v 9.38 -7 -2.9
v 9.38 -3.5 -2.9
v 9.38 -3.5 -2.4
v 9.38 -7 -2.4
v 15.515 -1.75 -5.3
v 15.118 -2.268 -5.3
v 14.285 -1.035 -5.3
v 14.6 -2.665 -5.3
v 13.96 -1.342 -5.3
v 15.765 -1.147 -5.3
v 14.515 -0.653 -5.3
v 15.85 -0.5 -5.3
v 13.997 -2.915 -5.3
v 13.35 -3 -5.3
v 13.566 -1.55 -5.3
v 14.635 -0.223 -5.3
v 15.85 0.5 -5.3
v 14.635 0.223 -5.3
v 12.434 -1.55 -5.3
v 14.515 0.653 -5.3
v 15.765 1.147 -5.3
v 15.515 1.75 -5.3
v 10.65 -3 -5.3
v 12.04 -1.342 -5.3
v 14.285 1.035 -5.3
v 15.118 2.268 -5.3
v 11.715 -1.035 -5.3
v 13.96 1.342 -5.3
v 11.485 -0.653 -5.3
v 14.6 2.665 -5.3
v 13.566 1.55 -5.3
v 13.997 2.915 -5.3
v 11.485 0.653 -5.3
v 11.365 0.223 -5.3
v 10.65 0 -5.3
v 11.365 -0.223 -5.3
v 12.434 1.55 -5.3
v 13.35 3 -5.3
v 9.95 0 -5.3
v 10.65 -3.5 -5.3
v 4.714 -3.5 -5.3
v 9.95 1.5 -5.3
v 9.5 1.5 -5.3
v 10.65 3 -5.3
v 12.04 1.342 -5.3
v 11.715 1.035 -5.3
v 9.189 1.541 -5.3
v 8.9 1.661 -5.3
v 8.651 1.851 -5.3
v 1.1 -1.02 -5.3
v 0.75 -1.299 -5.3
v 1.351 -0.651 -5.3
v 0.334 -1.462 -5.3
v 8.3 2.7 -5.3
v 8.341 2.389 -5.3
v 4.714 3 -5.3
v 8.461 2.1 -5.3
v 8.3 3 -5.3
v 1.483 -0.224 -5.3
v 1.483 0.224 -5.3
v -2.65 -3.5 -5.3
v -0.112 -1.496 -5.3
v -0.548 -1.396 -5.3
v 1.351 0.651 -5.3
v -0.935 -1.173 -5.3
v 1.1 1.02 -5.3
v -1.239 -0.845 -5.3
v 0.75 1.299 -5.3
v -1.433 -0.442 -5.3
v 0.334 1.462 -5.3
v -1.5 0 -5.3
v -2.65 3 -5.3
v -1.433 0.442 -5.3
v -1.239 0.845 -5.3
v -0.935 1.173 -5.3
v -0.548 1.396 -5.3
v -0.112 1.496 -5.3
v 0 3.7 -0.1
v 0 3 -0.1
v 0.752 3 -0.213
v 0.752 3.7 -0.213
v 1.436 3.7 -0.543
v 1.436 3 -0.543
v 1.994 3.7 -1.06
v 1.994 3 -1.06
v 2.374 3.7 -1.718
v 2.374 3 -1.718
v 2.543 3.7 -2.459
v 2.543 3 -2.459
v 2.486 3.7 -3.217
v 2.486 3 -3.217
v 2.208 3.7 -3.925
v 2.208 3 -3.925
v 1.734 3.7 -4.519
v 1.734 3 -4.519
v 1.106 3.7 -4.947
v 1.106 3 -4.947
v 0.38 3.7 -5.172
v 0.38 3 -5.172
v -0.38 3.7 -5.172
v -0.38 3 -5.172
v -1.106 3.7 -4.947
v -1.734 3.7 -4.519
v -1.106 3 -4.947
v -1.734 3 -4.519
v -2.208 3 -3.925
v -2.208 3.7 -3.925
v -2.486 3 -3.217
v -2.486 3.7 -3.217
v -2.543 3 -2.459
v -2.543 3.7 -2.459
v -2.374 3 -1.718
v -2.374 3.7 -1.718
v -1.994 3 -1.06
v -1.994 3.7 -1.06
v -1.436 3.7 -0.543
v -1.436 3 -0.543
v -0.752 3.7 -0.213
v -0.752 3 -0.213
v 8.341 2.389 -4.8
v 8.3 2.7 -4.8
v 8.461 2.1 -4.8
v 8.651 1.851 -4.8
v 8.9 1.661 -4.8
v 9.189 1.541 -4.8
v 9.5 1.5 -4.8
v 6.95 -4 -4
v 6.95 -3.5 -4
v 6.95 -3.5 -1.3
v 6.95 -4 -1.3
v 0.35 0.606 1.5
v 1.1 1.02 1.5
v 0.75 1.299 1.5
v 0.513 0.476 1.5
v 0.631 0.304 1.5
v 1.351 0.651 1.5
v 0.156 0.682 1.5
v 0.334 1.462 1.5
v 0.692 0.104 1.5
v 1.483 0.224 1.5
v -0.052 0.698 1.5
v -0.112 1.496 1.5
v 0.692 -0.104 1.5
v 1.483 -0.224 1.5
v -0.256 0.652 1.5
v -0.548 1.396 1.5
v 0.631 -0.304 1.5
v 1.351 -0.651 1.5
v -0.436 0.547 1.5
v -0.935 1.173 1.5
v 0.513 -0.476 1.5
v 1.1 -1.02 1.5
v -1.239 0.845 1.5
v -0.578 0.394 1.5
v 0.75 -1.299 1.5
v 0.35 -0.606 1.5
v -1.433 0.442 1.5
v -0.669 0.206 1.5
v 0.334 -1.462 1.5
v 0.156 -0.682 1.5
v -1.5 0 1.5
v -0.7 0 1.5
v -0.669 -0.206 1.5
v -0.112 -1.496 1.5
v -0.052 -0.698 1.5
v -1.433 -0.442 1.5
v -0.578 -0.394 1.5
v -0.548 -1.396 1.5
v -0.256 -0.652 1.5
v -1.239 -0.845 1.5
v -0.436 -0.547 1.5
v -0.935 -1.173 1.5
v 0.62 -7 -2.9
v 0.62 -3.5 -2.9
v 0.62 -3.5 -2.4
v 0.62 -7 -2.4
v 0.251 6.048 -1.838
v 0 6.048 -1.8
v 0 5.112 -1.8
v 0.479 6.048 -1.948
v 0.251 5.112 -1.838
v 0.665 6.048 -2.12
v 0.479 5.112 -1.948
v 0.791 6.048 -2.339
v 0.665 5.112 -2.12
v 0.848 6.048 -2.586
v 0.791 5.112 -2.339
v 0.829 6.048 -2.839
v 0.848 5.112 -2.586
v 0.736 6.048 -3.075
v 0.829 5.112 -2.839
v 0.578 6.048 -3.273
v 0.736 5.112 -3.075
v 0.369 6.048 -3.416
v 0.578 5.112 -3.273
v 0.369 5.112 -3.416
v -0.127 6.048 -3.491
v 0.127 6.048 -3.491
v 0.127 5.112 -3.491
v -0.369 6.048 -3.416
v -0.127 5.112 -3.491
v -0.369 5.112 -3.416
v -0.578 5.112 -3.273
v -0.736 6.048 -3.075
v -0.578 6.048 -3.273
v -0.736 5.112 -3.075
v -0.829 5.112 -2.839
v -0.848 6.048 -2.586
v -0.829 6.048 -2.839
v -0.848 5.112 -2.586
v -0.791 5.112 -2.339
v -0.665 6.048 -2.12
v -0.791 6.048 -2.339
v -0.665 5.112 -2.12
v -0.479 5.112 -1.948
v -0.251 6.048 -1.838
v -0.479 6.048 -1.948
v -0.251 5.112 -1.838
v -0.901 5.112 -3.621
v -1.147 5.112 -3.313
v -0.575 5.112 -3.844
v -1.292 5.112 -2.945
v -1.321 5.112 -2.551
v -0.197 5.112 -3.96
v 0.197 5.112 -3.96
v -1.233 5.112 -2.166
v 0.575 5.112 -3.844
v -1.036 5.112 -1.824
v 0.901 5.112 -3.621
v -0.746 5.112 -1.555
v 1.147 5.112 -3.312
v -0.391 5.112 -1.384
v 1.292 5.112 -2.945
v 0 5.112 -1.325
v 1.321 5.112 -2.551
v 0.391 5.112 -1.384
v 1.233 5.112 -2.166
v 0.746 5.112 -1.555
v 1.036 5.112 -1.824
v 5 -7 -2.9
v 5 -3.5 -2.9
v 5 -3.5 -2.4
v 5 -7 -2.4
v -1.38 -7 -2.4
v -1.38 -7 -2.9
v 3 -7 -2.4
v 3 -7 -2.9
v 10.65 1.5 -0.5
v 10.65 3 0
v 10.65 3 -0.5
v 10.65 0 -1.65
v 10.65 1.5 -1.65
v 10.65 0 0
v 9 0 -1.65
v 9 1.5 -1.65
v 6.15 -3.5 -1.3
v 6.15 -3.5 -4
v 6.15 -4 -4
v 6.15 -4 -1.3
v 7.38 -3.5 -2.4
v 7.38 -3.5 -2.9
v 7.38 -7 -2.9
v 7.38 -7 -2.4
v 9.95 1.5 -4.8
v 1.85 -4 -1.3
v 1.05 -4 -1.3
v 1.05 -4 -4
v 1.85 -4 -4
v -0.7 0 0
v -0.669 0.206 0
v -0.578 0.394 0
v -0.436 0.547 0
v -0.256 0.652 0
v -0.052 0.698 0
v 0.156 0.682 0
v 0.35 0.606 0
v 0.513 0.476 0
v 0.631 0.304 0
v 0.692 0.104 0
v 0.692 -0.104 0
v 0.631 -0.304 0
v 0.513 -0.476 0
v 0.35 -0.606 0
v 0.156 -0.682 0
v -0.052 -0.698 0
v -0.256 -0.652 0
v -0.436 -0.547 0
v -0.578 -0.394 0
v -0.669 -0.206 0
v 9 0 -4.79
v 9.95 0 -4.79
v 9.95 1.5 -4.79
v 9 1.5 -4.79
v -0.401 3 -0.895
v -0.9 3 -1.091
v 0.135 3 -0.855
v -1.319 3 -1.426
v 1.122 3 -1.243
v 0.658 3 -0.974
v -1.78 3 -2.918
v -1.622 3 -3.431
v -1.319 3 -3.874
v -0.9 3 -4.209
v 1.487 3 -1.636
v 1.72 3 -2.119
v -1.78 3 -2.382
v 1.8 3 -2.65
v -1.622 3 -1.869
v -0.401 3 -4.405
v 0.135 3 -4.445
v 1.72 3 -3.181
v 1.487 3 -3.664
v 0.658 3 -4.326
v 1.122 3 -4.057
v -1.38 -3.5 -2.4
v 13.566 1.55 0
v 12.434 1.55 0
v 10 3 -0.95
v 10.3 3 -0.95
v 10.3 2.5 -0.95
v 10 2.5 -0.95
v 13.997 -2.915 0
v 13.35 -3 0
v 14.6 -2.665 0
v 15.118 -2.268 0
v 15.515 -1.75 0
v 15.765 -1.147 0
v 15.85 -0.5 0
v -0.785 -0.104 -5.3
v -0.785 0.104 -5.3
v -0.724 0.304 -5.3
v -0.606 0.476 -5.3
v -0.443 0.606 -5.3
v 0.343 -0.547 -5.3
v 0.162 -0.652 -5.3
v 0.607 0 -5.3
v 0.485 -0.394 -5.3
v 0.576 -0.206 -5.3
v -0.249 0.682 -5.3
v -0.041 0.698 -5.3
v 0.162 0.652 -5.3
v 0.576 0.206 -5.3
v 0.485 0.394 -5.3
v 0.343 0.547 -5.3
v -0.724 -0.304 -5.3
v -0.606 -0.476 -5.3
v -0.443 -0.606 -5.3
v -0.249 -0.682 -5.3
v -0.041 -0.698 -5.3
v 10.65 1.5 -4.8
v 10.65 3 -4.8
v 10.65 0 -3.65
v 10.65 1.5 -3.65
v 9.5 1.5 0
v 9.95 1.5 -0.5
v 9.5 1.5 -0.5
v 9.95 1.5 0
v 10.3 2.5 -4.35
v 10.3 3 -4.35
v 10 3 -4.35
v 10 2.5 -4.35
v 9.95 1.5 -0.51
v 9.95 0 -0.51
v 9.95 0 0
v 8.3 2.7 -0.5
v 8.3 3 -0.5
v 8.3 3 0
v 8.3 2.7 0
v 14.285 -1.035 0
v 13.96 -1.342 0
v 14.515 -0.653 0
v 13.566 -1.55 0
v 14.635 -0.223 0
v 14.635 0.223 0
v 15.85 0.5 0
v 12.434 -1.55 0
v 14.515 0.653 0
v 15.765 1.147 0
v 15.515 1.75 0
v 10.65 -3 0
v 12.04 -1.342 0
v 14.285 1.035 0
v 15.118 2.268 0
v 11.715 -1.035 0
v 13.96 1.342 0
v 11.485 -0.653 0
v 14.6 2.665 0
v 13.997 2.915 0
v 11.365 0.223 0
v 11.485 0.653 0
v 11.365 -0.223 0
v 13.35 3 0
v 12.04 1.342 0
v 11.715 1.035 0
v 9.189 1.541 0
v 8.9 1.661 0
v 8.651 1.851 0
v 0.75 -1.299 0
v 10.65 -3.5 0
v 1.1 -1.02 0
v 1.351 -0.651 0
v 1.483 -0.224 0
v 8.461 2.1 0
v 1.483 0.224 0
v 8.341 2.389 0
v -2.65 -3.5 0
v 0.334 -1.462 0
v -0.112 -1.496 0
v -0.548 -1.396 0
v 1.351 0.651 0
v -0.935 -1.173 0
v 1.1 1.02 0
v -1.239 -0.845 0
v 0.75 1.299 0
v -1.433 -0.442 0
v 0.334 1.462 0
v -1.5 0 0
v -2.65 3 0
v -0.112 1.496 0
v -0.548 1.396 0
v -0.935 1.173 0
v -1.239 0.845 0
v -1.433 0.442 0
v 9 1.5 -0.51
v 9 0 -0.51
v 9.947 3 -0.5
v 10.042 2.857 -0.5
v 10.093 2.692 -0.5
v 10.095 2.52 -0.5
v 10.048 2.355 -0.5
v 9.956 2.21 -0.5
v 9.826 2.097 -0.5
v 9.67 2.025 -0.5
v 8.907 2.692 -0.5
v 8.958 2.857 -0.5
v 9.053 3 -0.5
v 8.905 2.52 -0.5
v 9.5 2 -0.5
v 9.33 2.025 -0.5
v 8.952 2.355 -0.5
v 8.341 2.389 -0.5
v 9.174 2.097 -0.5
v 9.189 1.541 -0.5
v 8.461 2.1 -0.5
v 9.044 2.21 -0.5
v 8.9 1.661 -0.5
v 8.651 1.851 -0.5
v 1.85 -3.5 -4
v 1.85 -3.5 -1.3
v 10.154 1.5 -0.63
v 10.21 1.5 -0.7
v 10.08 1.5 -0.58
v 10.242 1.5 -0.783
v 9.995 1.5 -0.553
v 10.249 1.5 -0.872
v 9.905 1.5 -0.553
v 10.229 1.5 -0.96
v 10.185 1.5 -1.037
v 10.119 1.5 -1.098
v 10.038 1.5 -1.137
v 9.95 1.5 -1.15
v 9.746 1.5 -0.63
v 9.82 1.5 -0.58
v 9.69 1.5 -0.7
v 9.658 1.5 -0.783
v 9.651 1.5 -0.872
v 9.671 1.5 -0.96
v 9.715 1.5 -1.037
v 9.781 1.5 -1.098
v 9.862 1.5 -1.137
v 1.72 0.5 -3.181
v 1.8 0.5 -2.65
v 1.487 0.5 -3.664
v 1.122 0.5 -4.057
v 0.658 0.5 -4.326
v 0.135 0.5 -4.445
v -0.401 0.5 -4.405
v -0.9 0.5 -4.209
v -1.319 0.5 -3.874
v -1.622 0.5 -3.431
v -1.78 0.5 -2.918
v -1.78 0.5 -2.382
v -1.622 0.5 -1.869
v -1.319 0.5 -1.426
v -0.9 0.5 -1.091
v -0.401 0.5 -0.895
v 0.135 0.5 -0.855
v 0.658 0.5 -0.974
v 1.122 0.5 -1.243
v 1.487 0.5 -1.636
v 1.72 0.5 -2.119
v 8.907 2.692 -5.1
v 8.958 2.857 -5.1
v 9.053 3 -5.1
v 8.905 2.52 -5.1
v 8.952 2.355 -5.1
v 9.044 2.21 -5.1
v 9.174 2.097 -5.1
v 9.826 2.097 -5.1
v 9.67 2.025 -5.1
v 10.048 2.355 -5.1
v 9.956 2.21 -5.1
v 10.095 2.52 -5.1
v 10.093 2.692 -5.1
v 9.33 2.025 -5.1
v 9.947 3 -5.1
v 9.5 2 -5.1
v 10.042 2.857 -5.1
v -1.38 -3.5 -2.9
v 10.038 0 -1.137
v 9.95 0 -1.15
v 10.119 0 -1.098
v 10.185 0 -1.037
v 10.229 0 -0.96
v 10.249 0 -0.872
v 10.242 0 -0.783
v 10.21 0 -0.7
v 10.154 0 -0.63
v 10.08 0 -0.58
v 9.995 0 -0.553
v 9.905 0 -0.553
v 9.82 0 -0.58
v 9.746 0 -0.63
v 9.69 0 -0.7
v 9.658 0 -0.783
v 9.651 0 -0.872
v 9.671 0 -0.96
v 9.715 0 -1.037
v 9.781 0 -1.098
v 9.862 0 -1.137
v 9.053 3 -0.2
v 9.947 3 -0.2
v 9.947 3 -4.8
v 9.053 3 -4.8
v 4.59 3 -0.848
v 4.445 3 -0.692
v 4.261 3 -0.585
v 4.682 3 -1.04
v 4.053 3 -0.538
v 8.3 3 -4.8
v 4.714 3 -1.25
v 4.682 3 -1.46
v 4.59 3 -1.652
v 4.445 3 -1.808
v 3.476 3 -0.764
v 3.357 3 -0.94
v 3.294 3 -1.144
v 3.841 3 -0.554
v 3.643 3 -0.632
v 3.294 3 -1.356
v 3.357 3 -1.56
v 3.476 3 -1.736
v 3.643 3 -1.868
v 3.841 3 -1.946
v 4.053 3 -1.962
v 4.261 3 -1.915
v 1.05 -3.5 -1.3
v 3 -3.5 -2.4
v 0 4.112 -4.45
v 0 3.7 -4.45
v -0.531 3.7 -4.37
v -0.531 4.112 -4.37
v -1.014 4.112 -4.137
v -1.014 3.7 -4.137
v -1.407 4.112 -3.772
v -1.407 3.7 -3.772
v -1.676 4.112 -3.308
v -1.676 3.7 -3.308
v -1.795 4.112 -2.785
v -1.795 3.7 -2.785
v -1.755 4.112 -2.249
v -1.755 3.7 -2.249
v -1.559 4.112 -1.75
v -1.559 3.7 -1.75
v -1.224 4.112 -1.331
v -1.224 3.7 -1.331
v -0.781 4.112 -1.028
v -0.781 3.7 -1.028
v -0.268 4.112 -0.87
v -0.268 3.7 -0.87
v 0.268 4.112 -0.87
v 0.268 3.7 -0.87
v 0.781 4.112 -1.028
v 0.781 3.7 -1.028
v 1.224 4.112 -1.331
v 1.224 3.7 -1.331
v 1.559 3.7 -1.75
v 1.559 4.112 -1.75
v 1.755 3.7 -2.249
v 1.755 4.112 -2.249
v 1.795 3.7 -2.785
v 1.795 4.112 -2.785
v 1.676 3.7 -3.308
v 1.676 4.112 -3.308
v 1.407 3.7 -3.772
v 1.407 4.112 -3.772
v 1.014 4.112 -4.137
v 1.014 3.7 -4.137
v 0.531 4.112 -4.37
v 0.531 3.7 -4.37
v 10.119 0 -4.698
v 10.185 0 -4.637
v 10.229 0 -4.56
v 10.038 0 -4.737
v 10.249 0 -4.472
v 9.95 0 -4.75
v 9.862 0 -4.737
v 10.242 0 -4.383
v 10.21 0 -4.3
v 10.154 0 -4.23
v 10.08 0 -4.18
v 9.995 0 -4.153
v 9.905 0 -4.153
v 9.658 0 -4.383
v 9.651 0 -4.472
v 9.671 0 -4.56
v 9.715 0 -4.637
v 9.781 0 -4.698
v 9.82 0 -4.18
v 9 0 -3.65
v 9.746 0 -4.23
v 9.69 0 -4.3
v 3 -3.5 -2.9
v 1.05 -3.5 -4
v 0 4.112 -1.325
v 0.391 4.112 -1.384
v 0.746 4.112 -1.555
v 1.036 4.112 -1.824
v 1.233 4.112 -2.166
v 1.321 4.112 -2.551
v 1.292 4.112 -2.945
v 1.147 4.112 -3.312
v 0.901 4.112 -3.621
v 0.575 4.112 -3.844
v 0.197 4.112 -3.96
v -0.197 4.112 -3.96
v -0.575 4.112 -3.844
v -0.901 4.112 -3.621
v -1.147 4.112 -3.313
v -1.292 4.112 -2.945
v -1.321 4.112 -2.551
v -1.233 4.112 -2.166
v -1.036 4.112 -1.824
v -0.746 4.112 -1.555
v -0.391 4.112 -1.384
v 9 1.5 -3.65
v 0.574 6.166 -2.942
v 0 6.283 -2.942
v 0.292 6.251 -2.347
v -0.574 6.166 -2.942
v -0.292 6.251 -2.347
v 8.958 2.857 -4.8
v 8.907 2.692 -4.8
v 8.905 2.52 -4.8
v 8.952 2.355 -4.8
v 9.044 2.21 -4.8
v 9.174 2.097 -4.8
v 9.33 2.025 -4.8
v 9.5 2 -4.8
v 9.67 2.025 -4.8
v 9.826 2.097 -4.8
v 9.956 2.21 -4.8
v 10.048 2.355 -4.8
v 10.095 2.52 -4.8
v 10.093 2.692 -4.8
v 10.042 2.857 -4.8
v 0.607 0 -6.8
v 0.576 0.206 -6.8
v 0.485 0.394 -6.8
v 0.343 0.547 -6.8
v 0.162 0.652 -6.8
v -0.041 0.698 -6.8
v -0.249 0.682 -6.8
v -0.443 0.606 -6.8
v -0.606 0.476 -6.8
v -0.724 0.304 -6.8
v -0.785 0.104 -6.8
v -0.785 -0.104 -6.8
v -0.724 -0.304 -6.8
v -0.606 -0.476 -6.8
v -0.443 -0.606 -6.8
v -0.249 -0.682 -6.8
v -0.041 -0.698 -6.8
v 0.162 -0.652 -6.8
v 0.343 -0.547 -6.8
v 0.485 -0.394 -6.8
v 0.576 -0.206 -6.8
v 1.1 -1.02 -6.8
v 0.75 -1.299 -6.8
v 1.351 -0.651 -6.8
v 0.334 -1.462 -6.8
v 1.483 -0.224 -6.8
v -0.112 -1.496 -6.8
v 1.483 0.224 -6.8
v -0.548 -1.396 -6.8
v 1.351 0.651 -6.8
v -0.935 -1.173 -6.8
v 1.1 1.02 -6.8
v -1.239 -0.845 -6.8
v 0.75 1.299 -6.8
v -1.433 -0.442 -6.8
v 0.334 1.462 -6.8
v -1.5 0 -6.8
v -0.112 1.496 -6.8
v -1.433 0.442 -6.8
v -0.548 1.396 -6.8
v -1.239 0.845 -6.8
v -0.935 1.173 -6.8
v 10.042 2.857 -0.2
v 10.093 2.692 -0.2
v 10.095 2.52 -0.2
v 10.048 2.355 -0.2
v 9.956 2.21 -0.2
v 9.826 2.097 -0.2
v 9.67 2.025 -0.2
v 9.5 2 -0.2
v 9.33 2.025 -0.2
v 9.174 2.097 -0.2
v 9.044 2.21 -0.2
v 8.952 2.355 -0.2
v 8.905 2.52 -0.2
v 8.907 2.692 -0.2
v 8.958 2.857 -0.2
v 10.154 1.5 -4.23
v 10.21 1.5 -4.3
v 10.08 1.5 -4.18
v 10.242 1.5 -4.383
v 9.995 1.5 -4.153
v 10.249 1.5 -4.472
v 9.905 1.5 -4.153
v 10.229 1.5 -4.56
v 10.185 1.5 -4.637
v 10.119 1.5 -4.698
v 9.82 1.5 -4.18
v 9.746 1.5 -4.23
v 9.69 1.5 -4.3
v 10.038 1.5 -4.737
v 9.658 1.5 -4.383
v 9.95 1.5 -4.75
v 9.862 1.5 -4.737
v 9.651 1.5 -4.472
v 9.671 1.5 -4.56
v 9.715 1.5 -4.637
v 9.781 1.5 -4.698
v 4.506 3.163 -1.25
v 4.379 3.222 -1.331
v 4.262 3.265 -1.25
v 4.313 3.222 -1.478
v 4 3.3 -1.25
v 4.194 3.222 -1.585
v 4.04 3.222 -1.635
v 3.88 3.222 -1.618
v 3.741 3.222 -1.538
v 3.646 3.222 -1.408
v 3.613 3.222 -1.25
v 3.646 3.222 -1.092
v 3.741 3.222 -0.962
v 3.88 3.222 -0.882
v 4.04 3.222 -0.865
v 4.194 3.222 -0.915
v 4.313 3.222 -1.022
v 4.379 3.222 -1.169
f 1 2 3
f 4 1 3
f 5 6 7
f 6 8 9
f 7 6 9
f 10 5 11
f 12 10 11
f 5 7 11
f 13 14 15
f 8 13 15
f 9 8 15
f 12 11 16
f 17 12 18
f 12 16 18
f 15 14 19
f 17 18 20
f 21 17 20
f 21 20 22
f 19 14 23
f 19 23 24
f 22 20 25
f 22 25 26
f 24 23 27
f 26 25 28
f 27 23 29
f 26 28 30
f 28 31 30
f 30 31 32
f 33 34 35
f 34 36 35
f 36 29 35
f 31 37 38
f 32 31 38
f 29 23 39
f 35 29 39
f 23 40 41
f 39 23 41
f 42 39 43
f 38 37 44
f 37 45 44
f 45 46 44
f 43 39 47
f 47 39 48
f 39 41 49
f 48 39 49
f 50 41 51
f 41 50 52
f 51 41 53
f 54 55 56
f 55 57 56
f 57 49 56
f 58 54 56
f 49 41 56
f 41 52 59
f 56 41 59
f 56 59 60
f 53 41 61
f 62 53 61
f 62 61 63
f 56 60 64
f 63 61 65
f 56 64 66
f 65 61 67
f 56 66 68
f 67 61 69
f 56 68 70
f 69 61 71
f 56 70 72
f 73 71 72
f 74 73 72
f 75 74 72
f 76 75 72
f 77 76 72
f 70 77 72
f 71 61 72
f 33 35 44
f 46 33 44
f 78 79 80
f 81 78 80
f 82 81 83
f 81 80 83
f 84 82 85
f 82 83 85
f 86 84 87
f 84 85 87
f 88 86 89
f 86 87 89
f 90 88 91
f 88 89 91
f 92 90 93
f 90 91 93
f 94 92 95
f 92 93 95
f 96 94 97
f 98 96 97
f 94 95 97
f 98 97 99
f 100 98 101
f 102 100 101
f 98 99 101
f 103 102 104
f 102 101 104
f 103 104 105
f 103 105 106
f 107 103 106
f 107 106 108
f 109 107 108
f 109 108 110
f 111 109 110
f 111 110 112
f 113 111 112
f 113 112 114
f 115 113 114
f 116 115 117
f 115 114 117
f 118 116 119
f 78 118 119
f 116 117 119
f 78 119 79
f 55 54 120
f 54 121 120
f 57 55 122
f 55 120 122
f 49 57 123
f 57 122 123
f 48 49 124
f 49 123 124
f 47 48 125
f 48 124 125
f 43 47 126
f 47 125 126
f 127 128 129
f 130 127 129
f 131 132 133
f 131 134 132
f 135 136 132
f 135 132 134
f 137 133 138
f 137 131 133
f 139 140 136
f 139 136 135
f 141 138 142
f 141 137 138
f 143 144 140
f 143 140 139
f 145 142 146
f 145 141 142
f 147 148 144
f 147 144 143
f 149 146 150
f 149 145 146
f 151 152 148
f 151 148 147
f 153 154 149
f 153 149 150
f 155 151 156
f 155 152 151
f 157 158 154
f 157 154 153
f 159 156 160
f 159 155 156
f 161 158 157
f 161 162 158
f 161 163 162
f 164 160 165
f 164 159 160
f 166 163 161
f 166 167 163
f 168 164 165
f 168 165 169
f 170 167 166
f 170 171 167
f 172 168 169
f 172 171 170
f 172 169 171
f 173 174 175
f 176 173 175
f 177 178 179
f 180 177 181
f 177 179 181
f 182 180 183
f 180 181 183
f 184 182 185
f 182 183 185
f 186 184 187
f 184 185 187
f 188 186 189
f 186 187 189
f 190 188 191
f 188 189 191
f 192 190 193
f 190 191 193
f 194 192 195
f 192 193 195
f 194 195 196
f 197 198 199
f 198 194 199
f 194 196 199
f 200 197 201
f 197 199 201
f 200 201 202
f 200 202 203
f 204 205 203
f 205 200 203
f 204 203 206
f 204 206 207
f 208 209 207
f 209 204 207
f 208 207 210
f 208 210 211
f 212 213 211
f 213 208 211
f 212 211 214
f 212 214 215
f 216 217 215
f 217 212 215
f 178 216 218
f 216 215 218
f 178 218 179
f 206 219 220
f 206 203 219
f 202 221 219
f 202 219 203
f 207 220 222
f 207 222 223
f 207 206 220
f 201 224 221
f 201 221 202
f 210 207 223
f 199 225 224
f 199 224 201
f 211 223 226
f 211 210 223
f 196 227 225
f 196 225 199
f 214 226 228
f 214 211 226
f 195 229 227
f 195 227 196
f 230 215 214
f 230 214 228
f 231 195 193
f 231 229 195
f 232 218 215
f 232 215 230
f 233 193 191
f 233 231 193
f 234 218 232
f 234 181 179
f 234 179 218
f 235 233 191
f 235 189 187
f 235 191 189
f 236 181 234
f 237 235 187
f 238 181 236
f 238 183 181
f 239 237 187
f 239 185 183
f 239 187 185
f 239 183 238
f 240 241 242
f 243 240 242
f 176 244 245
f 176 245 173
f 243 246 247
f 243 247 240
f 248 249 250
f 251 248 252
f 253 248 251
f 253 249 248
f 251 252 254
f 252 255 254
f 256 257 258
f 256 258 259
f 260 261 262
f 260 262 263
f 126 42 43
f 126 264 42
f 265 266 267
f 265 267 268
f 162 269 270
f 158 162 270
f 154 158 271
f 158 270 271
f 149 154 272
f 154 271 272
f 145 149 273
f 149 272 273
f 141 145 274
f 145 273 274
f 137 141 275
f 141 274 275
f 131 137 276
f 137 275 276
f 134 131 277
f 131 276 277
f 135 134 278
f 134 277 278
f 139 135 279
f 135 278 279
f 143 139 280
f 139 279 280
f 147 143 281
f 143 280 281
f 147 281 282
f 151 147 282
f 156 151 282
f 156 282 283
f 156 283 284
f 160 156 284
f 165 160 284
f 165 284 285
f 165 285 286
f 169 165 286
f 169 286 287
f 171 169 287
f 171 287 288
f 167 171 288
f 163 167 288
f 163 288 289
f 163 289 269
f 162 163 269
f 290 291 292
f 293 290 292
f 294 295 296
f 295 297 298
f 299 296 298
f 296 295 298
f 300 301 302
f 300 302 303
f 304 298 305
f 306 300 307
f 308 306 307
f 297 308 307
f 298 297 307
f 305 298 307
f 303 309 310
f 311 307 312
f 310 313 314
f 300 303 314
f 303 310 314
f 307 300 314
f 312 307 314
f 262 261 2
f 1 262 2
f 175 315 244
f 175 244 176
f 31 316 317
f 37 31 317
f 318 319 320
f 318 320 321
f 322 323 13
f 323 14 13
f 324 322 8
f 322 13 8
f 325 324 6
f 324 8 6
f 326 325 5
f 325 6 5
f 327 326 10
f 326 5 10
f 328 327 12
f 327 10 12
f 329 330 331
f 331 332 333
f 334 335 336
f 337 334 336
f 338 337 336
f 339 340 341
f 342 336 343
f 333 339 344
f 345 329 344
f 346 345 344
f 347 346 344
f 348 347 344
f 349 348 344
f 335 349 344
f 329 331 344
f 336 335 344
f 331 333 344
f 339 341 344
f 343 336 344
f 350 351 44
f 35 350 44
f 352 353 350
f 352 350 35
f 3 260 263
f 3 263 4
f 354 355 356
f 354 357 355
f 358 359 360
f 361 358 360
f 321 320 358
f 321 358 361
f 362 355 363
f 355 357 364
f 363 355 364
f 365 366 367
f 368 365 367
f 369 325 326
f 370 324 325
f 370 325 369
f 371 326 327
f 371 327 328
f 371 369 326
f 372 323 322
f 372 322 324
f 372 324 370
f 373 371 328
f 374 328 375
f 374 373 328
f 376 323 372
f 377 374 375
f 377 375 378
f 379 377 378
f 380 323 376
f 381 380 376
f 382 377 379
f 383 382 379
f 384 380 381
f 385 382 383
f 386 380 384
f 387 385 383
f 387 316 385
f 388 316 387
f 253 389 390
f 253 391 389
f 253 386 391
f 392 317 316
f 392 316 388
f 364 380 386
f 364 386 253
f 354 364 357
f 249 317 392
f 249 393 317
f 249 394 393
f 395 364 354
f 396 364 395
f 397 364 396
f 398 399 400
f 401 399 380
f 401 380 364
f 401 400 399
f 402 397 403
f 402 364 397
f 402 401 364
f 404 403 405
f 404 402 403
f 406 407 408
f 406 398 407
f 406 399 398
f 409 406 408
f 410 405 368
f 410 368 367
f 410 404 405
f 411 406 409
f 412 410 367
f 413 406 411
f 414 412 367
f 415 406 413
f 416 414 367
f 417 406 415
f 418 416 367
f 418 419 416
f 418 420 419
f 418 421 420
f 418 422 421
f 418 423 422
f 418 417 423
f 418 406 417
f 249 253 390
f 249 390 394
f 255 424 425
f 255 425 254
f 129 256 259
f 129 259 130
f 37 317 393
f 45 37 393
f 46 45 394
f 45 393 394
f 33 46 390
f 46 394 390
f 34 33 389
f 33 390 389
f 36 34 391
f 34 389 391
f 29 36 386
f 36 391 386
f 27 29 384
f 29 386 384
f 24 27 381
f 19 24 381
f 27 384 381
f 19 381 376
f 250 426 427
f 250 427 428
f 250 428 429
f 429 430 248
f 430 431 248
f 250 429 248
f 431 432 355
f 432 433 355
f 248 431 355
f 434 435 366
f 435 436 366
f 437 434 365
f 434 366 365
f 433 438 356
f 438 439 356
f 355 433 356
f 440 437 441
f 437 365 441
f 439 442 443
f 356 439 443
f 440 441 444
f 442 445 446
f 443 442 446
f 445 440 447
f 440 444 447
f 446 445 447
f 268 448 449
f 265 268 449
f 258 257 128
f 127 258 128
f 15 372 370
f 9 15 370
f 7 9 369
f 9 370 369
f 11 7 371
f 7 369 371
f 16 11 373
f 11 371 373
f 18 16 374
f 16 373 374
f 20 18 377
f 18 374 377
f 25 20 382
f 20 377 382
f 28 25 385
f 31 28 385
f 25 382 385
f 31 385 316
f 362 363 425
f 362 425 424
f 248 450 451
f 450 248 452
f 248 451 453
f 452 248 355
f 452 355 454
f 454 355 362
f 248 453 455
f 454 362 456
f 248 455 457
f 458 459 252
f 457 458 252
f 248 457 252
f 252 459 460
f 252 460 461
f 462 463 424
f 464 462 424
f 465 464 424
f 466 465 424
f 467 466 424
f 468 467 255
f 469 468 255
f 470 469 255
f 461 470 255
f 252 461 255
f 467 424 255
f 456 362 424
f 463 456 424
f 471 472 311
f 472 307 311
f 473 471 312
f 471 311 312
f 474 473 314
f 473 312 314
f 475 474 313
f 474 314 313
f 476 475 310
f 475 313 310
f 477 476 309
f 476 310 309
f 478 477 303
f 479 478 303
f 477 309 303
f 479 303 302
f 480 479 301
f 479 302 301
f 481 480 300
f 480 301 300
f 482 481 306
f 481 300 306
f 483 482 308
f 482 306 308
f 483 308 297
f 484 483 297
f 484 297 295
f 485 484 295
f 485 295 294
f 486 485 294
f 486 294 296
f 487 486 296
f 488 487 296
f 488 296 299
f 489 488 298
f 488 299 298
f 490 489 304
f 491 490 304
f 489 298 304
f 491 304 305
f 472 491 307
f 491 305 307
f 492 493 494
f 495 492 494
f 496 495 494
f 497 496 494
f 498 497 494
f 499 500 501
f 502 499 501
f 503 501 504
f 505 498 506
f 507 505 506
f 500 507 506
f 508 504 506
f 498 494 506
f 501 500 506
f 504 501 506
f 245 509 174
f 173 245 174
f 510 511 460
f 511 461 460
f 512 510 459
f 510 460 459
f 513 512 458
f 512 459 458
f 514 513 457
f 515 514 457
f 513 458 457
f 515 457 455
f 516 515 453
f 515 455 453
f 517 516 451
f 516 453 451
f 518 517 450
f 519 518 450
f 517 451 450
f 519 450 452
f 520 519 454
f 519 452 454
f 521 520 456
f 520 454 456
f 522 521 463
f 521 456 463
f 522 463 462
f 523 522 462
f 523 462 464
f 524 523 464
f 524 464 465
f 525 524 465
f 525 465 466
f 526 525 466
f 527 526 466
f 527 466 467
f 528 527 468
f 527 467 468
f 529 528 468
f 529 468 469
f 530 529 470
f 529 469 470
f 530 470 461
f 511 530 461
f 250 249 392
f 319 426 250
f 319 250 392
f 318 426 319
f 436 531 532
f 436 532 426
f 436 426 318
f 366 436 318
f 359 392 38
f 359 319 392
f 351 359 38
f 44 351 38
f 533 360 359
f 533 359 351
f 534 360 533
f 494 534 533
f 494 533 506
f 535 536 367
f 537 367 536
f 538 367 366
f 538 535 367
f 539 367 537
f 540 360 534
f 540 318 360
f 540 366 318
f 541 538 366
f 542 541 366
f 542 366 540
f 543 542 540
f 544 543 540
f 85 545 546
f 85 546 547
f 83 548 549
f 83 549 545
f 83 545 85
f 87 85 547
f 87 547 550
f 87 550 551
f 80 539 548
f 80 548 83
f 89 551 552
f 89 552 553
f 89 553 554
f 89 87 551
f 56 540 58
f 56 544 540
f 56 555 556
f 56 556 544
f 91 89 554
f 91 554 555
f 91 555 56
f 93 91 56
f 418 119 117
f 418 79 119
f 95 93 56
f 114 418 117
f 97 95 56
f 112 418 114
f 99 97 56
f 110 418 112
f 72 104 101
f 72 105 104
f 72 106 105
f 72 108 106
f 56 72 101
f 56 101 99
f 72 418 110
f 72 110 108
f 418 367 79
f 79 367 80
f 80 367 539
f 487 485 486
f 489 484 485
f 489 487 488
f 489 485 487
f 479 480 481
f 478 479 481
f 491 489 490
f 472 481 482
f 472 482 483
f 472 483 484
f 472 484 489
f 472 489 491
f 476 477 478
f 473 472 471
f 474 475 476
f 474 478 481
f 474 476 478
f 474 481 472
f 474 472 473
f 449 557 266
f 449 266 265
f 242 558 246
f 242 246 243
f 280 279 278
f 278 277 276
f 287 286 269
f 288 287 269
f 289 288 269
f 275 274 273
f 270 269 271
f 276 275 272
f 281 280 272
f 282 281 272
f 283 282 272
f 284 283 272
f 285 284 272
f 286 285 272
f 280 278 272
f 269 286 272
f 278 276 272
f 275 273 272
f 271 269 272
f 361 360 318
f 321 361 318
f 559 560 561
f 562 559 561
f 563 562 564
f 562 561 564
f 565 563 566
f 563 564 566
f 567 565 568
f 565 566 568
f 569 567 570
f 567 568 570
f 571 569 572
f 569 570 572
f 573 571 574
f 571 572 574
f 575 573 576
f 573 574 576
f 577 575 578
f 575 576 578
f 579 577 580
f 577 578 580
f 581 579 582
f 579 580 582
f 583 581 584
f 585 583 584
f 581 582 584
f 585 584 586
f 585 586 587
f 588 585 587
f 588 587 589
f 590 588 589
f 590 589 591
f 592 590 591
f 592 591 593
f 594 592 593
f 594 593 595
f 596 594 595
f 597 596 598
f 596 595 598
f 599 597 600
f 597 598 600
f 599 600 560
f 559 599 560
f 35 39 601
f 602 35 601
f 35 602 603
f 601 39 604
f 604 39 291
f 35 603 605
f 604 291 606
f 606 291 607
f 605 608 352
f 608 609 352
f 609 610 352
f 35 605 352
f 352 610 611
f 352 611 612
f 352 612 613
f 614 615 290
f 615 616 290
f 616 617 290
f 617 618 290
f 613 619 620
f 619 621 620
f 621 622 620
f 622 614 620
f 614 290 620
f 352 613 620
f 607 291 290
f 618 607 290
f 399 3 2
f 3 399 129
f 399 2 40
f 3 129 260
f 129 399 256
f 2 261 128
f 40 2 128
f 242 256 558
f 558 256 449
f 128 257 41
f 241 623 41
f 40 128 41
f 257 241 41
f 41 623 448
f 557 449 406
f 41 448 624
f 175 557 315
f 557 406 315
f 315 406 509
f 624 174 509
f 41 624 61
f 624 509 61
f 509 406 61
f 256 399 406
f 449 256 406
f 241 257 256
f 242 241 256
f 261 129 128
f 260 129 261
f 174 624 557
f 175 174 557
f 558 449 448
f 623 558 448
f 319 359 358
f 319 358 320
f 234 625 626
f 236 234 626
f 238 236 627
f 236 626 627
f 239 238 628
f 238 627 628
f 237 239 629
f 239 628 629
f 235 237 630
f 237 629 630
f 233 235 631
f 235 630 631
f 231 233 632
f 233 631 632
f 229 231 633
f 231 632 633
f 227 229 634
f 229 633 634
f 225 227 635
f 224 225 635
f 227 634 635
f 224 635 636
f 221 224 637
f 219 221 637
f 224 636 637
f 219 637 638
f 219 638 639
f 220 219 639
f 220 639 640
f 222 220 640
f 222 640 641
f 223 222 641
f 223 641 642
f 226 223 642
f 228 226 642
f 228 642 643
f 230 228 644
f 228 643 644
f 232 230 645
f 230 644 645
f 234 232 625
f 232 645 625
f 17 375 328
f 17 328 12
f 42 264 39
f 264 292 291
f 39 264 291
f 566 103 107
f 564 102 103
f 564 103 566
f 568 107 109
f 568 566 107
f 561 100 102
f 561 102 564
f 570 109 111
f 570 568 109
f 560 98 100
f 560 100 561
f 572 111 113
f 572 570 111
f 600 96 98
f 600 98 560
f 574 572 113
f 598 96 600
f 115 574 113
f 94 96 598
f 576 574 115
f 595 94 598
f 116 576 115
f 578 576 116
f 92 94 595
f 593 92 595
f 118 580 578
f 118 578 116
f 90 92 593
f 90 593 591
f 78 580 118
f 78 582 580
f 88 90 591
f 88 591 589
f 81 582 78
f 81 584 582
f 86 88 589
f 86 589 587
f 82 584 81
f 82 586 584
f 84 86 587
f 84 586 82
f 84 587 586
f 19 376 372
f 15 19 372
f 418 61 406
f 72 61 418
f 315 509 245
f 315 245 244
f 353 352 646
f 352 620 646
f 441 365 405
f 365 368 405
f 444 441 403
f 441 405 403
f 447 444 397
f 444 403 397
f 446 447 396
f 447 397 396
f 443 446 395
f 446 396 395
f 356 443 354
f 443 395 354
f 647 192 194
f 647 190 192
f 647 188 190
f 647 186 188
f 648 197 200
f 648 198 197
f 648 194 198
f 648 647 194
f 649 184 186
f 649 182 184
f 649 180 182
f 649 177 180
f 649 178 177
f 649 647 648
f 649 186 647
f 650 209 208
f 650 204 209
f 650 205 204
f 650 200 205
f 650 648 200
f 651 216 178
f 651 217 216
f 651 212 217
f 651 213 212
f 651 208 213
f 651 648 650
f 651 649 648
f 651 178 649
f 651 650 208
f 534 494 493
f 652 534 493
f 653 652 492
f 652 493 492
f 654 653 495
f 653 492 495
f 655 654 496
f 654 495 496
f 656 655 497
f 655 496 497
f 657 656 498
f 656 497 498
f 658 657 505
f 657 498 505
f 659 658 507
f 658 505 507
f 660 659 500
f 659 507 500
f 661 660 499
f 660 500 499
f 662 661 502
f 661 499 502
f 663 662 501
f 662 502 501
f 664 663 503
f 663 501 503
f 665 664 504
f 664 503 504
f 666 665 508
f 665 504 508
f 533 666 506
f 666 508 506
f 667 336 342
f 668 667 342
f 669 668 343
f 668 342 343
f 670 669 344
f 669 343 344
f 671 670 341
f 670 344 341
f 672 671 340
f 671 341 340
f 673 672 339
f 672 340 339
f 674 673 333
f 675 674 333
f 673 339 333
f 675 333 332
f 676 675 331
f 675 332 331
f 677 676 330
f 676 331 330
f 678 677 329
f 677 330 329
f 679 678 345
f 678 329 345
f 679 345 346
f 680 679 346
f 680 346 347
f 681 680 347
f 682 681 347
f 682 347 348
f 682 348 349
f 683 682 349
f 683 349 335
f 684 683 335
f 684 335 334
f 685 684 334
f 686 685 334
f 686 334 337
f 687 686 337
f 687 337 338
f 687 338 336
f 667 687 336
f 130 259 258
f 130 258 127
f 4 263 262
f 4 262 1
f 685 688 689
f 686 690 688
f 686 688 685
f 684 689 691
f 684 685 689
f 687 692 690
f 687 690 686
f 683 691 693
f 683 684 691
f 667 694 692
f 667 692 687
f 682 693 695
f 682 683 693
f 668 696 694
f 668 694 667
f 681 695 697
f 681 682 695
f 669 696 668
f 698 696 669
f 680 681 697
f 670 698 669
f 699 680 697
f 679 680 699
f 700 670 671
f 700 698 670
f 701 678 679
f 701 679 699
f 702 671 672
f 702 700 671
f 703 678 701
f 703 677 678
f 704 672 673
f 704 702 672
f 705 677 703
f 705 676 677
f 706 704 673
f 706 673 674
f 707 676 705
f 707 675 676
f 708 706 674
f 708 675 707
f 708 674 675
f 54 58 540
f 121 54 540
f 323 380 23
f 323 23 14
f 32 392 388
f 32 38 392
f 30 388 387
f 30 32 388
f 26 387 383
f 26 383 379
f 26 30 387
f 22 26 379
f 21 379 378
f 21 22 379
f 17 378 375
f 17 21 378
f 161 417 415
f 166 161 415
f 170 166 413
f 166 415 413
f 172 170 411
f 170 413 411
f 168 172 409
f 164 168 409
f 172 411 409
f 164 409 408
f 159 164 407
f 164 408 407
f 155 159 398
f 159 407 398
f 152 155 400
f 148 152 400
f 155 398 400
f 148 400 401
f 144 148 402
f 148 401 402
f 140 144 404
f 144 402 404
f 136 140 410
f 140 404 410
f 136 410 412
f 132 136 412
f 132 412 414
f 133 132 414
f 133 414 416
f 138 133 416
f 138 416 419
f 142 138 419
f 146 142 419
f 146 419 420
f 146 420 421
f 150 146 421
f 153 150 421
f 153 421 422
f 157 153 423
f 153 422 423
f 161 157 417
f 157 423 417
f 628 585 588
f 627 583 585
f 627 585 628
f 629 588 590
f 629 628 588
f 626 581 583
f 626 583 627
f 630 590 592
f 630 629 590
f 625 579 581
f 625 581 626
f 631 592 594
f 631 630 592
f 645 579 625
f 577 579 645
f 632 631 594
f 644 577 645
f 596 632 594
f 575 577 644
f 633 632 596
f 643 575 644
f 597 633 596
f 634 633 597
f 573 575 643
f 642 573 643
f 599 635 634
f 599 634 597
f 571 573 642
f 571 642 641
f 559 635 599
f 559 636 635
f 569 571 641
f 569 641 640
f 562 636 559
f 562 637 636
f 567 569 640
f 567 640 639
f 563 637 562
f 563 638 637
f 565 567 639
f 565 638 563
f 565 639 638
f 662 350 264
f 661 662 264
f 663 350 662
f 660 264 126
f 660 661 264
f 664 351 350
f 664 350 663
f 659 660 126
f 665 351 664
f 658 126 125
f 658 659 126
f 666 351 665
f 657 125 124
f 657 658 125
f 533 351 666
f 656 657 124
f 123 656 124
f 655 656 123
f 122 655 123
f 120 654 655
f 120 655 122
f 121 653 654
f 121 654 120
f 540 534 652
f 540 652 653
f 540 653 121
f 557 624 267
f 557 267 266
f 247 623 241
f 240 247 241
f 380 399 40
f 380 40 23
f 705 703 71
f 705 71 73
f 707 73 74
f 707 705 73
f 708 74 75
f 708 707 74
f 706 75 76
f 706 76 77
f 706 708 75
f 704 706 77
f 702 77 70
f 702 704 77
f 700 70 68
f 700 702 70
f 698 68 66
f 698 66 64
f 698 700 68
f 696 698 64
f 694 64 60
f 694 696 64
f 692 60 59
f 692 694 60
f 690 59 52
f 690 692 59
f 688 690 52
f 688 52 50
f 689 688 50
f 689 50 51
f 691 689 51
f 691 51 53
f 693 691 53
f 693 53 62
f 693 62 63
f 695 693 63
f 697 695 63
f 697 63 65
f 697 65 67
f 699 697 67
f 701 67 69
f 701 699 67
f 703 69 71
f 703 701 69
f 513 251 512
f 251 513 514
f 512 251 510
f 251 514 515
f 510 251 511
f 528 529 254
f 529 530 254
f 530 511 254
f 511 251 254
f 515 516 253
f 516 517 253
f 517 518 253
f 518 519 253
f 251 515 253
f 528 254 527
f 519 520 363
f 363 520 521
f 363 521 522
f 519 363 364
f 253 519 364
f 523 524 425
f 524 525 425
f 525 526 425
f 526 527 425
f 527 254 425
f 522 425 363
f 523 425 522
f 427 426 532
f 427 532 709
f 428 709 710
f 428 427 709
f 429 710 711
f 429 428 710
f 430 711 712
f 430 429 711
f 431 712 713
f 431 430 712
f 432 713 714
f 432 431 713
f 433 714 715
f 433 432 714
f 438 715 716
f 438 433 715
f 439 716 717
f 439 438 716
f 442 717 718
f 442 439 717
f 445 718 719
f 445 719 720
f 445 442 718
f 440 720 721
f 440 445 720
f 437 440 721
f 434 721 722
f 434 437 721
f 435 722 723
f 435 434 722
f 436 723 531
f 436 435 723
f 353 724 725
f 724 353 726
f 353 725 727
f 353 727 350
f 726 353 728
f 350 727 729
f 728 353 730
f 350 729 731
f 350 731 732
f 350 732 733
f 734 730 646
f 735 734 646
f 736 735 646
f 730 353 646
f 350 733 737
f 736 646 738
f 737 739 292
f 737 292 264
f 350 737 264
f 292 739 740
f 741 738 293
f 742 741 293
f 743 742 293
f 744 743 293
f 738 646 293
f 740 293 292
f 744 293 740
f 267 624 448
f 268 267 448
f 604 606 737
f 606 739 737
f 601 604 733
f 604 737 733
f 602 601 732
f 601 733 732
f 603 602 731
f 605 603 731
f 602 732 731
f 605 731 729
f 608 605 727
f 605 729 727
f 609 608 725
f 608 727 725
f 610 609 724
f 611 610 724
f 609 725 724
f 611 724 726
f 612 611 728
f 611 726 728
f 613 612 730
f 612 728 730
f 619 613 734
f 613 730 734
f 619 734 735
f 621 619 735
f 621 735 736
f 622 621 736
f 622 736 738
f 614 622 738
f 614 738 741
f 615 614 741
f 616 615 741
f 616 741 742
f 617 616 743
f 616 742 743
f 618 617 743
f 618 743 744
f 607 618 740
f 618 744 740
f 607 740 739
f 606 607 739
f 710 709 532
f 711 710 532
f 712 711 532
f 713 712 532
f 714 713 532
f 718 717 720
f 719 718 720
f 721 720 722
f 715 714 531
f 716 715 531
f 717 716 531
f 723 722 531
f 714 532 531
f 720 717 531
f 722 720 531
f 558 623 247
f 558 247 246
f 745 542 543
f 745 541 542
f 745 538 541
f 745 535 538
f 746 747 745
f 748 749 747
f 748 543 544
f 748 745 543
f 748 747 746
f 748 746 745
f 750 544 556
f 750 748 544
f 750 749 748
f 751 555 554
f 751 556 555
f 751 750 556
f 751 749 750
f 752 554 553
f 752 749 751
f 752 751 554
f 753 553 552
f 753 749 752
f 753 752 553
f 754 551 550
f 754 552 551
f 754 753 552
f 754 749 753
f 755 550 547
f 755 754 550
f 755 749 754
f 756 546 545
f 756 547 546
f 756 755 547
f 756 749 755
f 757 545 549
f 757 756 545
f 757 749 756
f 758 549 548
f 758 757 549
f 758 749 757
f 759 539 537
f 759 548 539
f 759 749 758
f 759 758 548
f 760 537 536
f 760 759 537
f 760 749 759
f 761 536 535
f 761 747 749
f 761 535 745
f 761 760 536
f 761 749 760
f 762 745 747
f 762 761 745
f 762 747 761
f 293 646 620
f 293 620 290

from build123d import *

# Parameters (mm, degrees)
BOSS_EXTRUDE1_START            = -6.5
BOSS_EXTRUDE1_OUTLINE_W        = 7.364142843
BOSS_EXTRUDE1_OUTLINE_H        = 4.764142843
BOSS_EXTRUDE1_DEPTH            = 6.5
SKETCH2_W                      = 7.364142843
SKETCH2_H                      = 6.5
BOSS_EXTRUDE2_DEPTH            = 0.535857157
SKETCH3_W                      = 5.3
SKETCH3_H                      = 6.5
BOSS_EXTRUDE3_DEPTH            = 11.135857157
CUT_EXTRUDE1_DEPTH             = 0.7
SKETCH5_W                      = 1.14
SKETCH5_H                      = 1.5
CUT_EXTRUDE2_DEPTH             = 0.95
CUT_EXTRUDE3_DEPTH             = 0.7
SKETCH7_W                      = 1.14
SKETCH7_H                      = 1.5
CUT_EXTRUDE4_DEPTH             = 0.95
SKETCH8_W                      = 5.2
SKETCH8_H                      = 0.5
CUT_EXTRUDE5_DEPTH             = 18.075201317
CUT_EXTRUDE6_DEPTH             = 18.075201317
SKETCH10_W                     = 2
SKETCH10_H                     = 0.5
BOSS_EXTRUDE4_DEPTH            = 3.5
SKETCH11_W                     = 2
SKETCH11_H                     = 0.5
BOSS_EXTRUDE5_DEPTH            = 3.5
SKETCH12_W                     = 2
SKETCH12_H                     = 0.5
BOSS_EXTRUDE6_DEPTH            = 3.5
SKETCH13_W                     = 0.8
SKETCH13_H                     = 2.7
BOSS_EXTRUDE7_DEPTH            = 0.5
SKETCH14_W                     = 0.8
SKETCH14_H                     = 2.7
BOSS_EXTRUDE8_DEPTH            = 0.5
SKETCH15_R                     = 2.55
BOSS_EXTRUDE9_DEPTH            = 0.7
SKETCH16_R                     = 1.8
BOSS_EXTRUDE10_DEPTH           = 0.411605056
SKETCH17_R                     = 1.325
BOSS_EXTRUDE11_DEPTH           = 1
BOSS_EXTRUDE12_REACH           = 22.64
BOSS_EXTRUDE12_END_RADIUS      = 1.5
SKETCH18_R                     = 0.85
SKETCH19_R                     = 1.5
BOSS_EXTRUDE13_DEPTH           = 1.5
BOSS_EXTRUDE14_START           = 1.5
SKETCH20_R                     = 1.5
BOSS_EXTRUDE14_DEPTH           = 1.5
SKETCH21_W                     = 1.65
SKETCH21_H                     = 0.5
CUT_EXTRUDE7_DEPTH             = 1.5
SKETCH22_W                     = 1.65
SKETCH22_H                     = 0.5
CUT_EXTRUDE8_DEPTH             = 1.5
BOSS_EXTRUDE15_DEPTH           = 0.3
BOSS_EXTRUDE16_START           = 0.3
BOSS_EXTRUDE16_DEPTH           = 0.3
SKETCH25_W                     = 0.29999989
SKETCH25_H                     = 3.4
CUT_EXTRUDE9_DEPTH             = 0.5
SKETCH26_W                     = 1.8
SKETCH26_H                     = 2.5
SKETCH27_W                     = 0.3
SKETCH27_H                     = 1.5
SKETCH28_W                     = 0.3
SKETCH28_H                     = 1.5
F_1_4_1_4_DIAMETER_HOLE1_D     = 1.4
F_1_4_1_4_DIAMETER_HOLE1_DEPTH = 1.5
F_1_4_1_4_DIAMETER_HOLE2_D     = 1.4
F_1_4_1_4_DIAMETER_HOLE2_DEPTH = 1.5
FILLET1_R                      = 1.2
FILLET2_R                      = 2.5


with BuildPart() as part:
    # Boss-Extrude1: read off the stored shape, not the designer's step
    # Boss-Extrude1 outline → Boss-Extrude1 (new body)
    with BuildSketch(Plane(origin=(0, 3, 0), x_dir=(1, 0, 0), z_dir=(0, 1, 0)).offset(BOSS_EXTRUDE1_START)):
        with Locations((1.032071421, 2.917928579)):
            Rectangle(BOSS_EXTRUDE1_OUTLINE_W, BOSS_EXTRUDE1_OUTLINE_H)
    extrude(amount=BOSS_EXTRUDE1_DEPTH)

    # Boss-Extrude1 2 outline → Boss-Extrude1 2 (revolve)
    with BuildSketch(Plane(origin=(4, 0, -1.25), x_dir=(1, 0, 0), z_dir=(0, 0, 1))):
        with BuildLine():
            Line((0, 2.999999999), (0.714142844, 2.999999999))
            ThreePointArc((0.714142844, 2.999999999), (0.387298335, 3.221954446), (0, 3.3))
            Line((0, 3.3), (0, 2.999999999))
        make_face()
    revolve(axis=Axis((4, 0, -1.25), (0, 1, 0)))

    # Sketch2 → Boss-Extrude2 (add)
    with BuildSketch(Plane.XY.offset(-0.535857157)):
        with Locations((1.032071421, -0.25)):
            Rectangle(SKETCH2_W, SKETCH2_H)
    extrude(amount=BOSS_EXTRUDE2_DEPTH)

    # Sketch3 → Boss-Extrude3 (add)
    with BuildSketch(Plane(origin=(4.714142843, 0, 0), x_dir=(0, 0, -1), z_dir=(1, 0, 0))):
        with Locations((2.65, -0.25)):
            Rectangle(SKETCH3_W, SKETCH3_H)
    extrude(amount=BOSS_EXTRUDE3_DEPTH)

    # Sketch4 → Cut-Extrude1 (cut)
    with BuildSketch(Plane(origin=(9.95, 0, 0), x_dir=(0, -1, 0), z_dir=(-1, 0, 0))):
        Polygon((-1.5, -0.5), (-1.5, -1.65), (0, -1.65), (0, 0), (-3, 0), (-3, -0.5), align=None)
    extrude(amount=-CUT_EXTRUDE1_DEPTH, mode=Mode.SUBTRACT)

    # Sketch5 → Cut-Extrude2 (cut)
    with BuildSketch(Plane(origin=(9.95, 0, 0), x_dir=(0, 0, -1), z_dir=(1, 0, 0))):
        with Locations((1.08, 0.75)):
            Rectangle(SKETCH5_W, SKETCH5_H)
    extrude(amount=-CUT_EXTRUDE2_DEPTH, mode=Mode.SUBTRACT)

    # Sketch6 → Cut-Extrude3 (cut)
    with BuildSketch(Plane(origin=(9.95, 0, 0), x_dir=(0, -1, 0), z_dir=(-1, 0, 0))):
        Polygon((-3, -5.3), (0, -5.3), (0, -3.65), (-1.5, -3.65), (-1.5, -4.8), (-3, -4.8), align=None)
    extrude(amount=-CUT_EXTRUDE3_DEPTH, mode=Mode.SUBTRACT)

    # Sketch7 → Cut-Extrude4 (cut)
    with BuildSketch(Plane(origin=(9.95, 0, 0), x_dir=(0, 0, -1), z_dir=(1, 0, 0))):
        with Locations((4.22, 0.75)):
            Rectangle(SKETCH7_W, SKETCH7_H)
    extrude(amount=-CUT_EXTRUDE4_DEPTH, mode=Mode.SUBTRACT)

    # Sketch8 → Cut-Extrude5 (cut, through all)
    with BuildSketch(Plane.XY):
        with Locations((13.25, -3.25)):
            Rectangle(SKETCH8_W, SKETCH8_H)
    extrude(amount=-CUT_EXTRUDE5_DEPTH, mode=Mode.SUBTRACT)

    # Sketch9 → Cut-Extrude6 (cut, through all)
    with BuildSketch(Plane.XY):
        with BuildLine():
            Line((13.565685425, 1.55), (12.434314575, 1.55))
            ThreePointArc((12.434314575, 1.55), (11.35, 0), (12.434314575, -1.55))
            Line((12.434314575, -1.55), (13.565685425, -1.55))
            ThreePointArc((13.565685425, -1.55), (14.65, 0), (13.565685425, 1.55))
        make_face()
    extrude(amount=-CUT_EXTRUDE6_DEPTH, mode=Mode.SUBTRACT)

    # Sketch10 → Boss-Extrude4 (add)
    with BuildSketch(Plane.XZ.offset(3.5)):
        with Locations((-0.38, -2.65)):
            Rectangle(SKETCH10_W, SKETCH10_H)
    extrude(amount=BOSS_EXTRUDE4_DEPTH)

    # Sketch11 → Boss-Extrude5 (add)
    with BuildSketch(Plane.XZ.offset(3.5)):
        with Locations((4, -2.65)):
            Rectangle(SKETCH11_W, SKETCH11_H)
    extrude(amount=BOSS_EXTRUDE5_DEPTH)

    # Sketch12 → Boss-Extrude6 (add)
    with BuildSketch(Plane.XZ.offset(3.5)):
        with Locations((8.38, -2.65)):
            Rectangle(SKETCH12_W, SKETCH12_H)
    extrude(amount=BOSS_EXTRUDE6_DEPTH)

    # Sketch13 → Boss-Extrude7 (add)
    with BuildSketch(Plane.XZ.offset(3.5)):
        with Locations((1.45, -2.65)):
            Rectangle(SKETCH13_W, SKETCH13_H)
    extrude(amount=BOSS_EXTRUDE7_DEPTH)

    # Sketch14 → Boss-Extrude8 (add)
    with BuildSketch(Plane.XZ.offset(3.5)):
        with Locations((6.55, -2.65)):
            Rectangle(SKETCH14_W, SKETCH14_H)
    extrude(amount=BOSS_EXTRUDE8_DEPTH)

    # Sketch15 → Boss-Extrude9 (add)
    with BuildSketch(Plane(origin=(0, 3, 0), x_dir=(-1, 0, 0), z_dir=(0, 1, 0))):
        with Locations(Location((0, -2.65, 0), (0, 0, 90))):
            Circle(SKETCH15_R)
    extrude(amount=BOSS_EXTRUDE9_DEPTH)

    # Sketch16 → Boss-Extrude10 (add)
    with BuildSketch(Plane(origin=(0, 3.7, 0), x_dir=(-1, 0, 0), z_dir=(0, 1, 0))):
        with Locations(Location((0, -2.65, 0), (0, 0, 270))):
            Circle(SKETCH16_R)
    extrude(amount=BOSS_EXTRUDE10_DEPTH)

    # Sketch17 → Boss-Extrude11 (add)
    with BuildSketch(Plane(origin=(0, 4.111605056, 0), x_dir=(-1, 0, 0), z_dir=(0, 1, 0))):
        with Locations(Location((0, -2.65, 0), (0, 0, 90))):
            Circle(SKETCH17_R)
    extrude(amount=BOSS_EXTRUDE11_DEPTH)

    # Boss-Extrude12: up to this sphere (the profile starts inside it)
    boss_extrude12_end = Location((0, 4.811605056, -2.65)) * Sphere(BOSS_EXTRUDE12_END_RADIUS, mode=Mode.PRIVATE)
    # Sketch18 → Boss-Extrude12 (add, up to the surface)
    with BuildSketch(Plane(origin=(0, 5.111605056, 0), x_dir=(-1, 0, 0), z_dir=(0, 1, 0)), mode=Mode.PRIVATE) as boss_extrude12_sk1:
        with Locations(Location((0, -2.65, 0), (0, 0, 90))):
            Circle(SKETCH18_R)
    boss_extrude12_tool1 = extrude(boss_extrude12_sk1.sketch, amount=BOSS_EXTRUDE12_REACH, mode=Mode.PRIVATE) & boss_extrude12_end
    add(boss_extrude12_tool1.solids().sort_by_distance((0, 5.111605, -2.65))[0])

    # Sketch19 → Boss-Extrude13 (add)
    with BuildSketch(Plane.XY):
        with Locations(Location((0, 0, 0), (0, 0, 180))):
            Circle(SKETCH19_R)
    extrude(amount=BOSS_EXTRUDE13_DEPTH)

    # Sketch20 → Boss-Extrude14 (add)
    with BuildSketch(Plane(origin=(0, 0, -5.3), x_dir=(-1, 0, 0), z_dir=(0, 0, -1)).offset(BOSS_EXTRUDE14_START)):
        Circle(SKETCH20_R)
    extrude(amount=-BOSS_EXTRUDE14_DEPTH)

    # Sketch21 → Cut-Extrude7 (cut)
    with BuildSketch(Plane(origin=(0, 3, 0), x_dir=(-1, 0, 0), z_dir=(0, 1, 0))):
        with Locations((-9.125, -0.25)):
            Rectangle(SKETCH21_W, SKETCH21_H)
    extrude(amount=-CUT_EXTRUDE7_DEPTH, mode=Mode.SUBTRACT)

    # Sketch22 → Cut-Extrude8 (cut)
    with BuildSketch(Plane(origin=(0, 3, 0), x_dir=(-1, 0, 0), z_dir=(0, 1, 0))):
        with Locations((-9.125, -5.05)):
            Rectangle(SKETCH22_W, SKETCH22_H)
    extrude(amount=-CUT_EXTRUDE8_DEPTH, mode=Mode.SUBTRACT)

    # Sketch23 → Boss-Extrude15 (add)
    with BuildSketch(Plane.XY.offset(-0.5)):
        with BuildLine():
            Line((9.052786405, 3), (9.947213595, 3))
            ThreePointArc((9.947213595, 3), (9.5, 2), (9.052786405, 3))
        make_face()
    extrude(amount=BOSS_EXTRUDE15_DEPTH)

    # Sketch24 → Boss-Extrude16 (add)
    with BuildSketch(Plane(origin=(0, 0, -4.8), x_dir=(-1, 0, 0), z_dir=(0, 0, -1)).offset(BOSS_EXTRUDE16_START)):
        with BuildLine():
            Line((-9.947213595, 3), (-9.052786405, 3))
            ThreePointArc((-9.052786405, 3), (-9.5, 2), (-9.947213595, 3))
        make_face()
    extrude(amount=-BOSS_EXTRUDE16_DEPTH)

    # Sketch25 → Cut-Extrude9 (cut)
    with BuildSketch(Plane(origin=(0, 3, 0), x_dir=(-1, 0, 0), z_dir=(0, 1, 0))):
        with Locations((-10.149999945, -2.65)):
            Rectangle(SKETCH25_W, SKETCH25_H)
    extrude(amount=-CUT_EXTRUDE9_DEPTH, mode=Mode.SUBTRACT)

    # Sketch26 → Cut-Revolve1 (revolve, cut)
    with BuildSketch(Plane(origin=(0, 0, -2.65), x_dir=(-1, 0, 0), z_dir=(0, 0, -1))):
        with Locations((-0.9, 1.75)):
            Rectangle(SKETCH26_W, SKETCH26_H)
    revolve(axis=Axis((0, 0.5, -2.65), (0, 1, 0)), mode=Mode.SUBTRACT)

    # Sketch27 → Revolve1 (revolve)
    with BuildSketch(Plane.XY.offset(-4.45), mode=Mode.PRIVATE) as revolve1_sk:
        with Locations((10.1, 0.75)):
            Rectangle(SKETCH27_W, SKETCH27_H)
    revolve(revolve1_sk.sketch.rotate(Axis((9.95, 1.5, -4.45), (0, -1, 0)), 270), axis=Axis((9.95, 1.5, -4.45), (0, -1, 0)))

    # Sketch28 → Revolve2 (revolve)
    with BuildSketch(Plane.XY.offset(-0.85), mode=Mode.PRIVATE) as revolve2_sk:
        with Locations((10.1, 0.75)):
            Rectangle(SKETCH28_W, SKETCH28_H)
    revolve(revolve2_sk.sketch.rotate(Axis((9.95, 1.5, -0.85), (0, -1, 0)), 270), axis=Axis((9.95, 1.5, -0.85), (0, -1, 0)))

    # Ø1.4 (1.4) Diameter Hole1
    with Locations(Plane(origin=(0, 0, -6.8), x_dir=(-1, 0, 0), z_dir=(0, 0, -1))):
        with Locations((0.093266982, 0)):
            Hole(F_1_4_1_4_DIAMETER_HOLE1_D / 2, depth=F_1_4_1_4_DIAMETER_HOLE1_DEPTH)

    # Ø1.4 (1.4) Diameter Hole2
    with Locations(Plane.XY.offset(1.5)):
        with Locations((0, 0)):
            Hole(F_1_4_1_4_DIAMETER_HOLE2_D / 2, depth=F_1_4_1_4_DIAMETER_HOLE2_DEPTH)

    # Fillet1
    fillet1_edges = [part.edges().sort_by_distance(p)[0] for p in [
        (8.3, 1.5, -0.25),
        (8.3, 1.5, -5.05),
    ]]
    fillet(fillet1_edges, radius=FILLET1_R)

    # Fillet2
    fillet2_edges = [part.edges().sort_by_distance(p)[0] for p in [
        (15.85, 3, -2.65),
        (15.85, -3, -2.65),
    ]]
    fillet(fillet2_edges, radius=FILLET2_R)


solid = part.part
